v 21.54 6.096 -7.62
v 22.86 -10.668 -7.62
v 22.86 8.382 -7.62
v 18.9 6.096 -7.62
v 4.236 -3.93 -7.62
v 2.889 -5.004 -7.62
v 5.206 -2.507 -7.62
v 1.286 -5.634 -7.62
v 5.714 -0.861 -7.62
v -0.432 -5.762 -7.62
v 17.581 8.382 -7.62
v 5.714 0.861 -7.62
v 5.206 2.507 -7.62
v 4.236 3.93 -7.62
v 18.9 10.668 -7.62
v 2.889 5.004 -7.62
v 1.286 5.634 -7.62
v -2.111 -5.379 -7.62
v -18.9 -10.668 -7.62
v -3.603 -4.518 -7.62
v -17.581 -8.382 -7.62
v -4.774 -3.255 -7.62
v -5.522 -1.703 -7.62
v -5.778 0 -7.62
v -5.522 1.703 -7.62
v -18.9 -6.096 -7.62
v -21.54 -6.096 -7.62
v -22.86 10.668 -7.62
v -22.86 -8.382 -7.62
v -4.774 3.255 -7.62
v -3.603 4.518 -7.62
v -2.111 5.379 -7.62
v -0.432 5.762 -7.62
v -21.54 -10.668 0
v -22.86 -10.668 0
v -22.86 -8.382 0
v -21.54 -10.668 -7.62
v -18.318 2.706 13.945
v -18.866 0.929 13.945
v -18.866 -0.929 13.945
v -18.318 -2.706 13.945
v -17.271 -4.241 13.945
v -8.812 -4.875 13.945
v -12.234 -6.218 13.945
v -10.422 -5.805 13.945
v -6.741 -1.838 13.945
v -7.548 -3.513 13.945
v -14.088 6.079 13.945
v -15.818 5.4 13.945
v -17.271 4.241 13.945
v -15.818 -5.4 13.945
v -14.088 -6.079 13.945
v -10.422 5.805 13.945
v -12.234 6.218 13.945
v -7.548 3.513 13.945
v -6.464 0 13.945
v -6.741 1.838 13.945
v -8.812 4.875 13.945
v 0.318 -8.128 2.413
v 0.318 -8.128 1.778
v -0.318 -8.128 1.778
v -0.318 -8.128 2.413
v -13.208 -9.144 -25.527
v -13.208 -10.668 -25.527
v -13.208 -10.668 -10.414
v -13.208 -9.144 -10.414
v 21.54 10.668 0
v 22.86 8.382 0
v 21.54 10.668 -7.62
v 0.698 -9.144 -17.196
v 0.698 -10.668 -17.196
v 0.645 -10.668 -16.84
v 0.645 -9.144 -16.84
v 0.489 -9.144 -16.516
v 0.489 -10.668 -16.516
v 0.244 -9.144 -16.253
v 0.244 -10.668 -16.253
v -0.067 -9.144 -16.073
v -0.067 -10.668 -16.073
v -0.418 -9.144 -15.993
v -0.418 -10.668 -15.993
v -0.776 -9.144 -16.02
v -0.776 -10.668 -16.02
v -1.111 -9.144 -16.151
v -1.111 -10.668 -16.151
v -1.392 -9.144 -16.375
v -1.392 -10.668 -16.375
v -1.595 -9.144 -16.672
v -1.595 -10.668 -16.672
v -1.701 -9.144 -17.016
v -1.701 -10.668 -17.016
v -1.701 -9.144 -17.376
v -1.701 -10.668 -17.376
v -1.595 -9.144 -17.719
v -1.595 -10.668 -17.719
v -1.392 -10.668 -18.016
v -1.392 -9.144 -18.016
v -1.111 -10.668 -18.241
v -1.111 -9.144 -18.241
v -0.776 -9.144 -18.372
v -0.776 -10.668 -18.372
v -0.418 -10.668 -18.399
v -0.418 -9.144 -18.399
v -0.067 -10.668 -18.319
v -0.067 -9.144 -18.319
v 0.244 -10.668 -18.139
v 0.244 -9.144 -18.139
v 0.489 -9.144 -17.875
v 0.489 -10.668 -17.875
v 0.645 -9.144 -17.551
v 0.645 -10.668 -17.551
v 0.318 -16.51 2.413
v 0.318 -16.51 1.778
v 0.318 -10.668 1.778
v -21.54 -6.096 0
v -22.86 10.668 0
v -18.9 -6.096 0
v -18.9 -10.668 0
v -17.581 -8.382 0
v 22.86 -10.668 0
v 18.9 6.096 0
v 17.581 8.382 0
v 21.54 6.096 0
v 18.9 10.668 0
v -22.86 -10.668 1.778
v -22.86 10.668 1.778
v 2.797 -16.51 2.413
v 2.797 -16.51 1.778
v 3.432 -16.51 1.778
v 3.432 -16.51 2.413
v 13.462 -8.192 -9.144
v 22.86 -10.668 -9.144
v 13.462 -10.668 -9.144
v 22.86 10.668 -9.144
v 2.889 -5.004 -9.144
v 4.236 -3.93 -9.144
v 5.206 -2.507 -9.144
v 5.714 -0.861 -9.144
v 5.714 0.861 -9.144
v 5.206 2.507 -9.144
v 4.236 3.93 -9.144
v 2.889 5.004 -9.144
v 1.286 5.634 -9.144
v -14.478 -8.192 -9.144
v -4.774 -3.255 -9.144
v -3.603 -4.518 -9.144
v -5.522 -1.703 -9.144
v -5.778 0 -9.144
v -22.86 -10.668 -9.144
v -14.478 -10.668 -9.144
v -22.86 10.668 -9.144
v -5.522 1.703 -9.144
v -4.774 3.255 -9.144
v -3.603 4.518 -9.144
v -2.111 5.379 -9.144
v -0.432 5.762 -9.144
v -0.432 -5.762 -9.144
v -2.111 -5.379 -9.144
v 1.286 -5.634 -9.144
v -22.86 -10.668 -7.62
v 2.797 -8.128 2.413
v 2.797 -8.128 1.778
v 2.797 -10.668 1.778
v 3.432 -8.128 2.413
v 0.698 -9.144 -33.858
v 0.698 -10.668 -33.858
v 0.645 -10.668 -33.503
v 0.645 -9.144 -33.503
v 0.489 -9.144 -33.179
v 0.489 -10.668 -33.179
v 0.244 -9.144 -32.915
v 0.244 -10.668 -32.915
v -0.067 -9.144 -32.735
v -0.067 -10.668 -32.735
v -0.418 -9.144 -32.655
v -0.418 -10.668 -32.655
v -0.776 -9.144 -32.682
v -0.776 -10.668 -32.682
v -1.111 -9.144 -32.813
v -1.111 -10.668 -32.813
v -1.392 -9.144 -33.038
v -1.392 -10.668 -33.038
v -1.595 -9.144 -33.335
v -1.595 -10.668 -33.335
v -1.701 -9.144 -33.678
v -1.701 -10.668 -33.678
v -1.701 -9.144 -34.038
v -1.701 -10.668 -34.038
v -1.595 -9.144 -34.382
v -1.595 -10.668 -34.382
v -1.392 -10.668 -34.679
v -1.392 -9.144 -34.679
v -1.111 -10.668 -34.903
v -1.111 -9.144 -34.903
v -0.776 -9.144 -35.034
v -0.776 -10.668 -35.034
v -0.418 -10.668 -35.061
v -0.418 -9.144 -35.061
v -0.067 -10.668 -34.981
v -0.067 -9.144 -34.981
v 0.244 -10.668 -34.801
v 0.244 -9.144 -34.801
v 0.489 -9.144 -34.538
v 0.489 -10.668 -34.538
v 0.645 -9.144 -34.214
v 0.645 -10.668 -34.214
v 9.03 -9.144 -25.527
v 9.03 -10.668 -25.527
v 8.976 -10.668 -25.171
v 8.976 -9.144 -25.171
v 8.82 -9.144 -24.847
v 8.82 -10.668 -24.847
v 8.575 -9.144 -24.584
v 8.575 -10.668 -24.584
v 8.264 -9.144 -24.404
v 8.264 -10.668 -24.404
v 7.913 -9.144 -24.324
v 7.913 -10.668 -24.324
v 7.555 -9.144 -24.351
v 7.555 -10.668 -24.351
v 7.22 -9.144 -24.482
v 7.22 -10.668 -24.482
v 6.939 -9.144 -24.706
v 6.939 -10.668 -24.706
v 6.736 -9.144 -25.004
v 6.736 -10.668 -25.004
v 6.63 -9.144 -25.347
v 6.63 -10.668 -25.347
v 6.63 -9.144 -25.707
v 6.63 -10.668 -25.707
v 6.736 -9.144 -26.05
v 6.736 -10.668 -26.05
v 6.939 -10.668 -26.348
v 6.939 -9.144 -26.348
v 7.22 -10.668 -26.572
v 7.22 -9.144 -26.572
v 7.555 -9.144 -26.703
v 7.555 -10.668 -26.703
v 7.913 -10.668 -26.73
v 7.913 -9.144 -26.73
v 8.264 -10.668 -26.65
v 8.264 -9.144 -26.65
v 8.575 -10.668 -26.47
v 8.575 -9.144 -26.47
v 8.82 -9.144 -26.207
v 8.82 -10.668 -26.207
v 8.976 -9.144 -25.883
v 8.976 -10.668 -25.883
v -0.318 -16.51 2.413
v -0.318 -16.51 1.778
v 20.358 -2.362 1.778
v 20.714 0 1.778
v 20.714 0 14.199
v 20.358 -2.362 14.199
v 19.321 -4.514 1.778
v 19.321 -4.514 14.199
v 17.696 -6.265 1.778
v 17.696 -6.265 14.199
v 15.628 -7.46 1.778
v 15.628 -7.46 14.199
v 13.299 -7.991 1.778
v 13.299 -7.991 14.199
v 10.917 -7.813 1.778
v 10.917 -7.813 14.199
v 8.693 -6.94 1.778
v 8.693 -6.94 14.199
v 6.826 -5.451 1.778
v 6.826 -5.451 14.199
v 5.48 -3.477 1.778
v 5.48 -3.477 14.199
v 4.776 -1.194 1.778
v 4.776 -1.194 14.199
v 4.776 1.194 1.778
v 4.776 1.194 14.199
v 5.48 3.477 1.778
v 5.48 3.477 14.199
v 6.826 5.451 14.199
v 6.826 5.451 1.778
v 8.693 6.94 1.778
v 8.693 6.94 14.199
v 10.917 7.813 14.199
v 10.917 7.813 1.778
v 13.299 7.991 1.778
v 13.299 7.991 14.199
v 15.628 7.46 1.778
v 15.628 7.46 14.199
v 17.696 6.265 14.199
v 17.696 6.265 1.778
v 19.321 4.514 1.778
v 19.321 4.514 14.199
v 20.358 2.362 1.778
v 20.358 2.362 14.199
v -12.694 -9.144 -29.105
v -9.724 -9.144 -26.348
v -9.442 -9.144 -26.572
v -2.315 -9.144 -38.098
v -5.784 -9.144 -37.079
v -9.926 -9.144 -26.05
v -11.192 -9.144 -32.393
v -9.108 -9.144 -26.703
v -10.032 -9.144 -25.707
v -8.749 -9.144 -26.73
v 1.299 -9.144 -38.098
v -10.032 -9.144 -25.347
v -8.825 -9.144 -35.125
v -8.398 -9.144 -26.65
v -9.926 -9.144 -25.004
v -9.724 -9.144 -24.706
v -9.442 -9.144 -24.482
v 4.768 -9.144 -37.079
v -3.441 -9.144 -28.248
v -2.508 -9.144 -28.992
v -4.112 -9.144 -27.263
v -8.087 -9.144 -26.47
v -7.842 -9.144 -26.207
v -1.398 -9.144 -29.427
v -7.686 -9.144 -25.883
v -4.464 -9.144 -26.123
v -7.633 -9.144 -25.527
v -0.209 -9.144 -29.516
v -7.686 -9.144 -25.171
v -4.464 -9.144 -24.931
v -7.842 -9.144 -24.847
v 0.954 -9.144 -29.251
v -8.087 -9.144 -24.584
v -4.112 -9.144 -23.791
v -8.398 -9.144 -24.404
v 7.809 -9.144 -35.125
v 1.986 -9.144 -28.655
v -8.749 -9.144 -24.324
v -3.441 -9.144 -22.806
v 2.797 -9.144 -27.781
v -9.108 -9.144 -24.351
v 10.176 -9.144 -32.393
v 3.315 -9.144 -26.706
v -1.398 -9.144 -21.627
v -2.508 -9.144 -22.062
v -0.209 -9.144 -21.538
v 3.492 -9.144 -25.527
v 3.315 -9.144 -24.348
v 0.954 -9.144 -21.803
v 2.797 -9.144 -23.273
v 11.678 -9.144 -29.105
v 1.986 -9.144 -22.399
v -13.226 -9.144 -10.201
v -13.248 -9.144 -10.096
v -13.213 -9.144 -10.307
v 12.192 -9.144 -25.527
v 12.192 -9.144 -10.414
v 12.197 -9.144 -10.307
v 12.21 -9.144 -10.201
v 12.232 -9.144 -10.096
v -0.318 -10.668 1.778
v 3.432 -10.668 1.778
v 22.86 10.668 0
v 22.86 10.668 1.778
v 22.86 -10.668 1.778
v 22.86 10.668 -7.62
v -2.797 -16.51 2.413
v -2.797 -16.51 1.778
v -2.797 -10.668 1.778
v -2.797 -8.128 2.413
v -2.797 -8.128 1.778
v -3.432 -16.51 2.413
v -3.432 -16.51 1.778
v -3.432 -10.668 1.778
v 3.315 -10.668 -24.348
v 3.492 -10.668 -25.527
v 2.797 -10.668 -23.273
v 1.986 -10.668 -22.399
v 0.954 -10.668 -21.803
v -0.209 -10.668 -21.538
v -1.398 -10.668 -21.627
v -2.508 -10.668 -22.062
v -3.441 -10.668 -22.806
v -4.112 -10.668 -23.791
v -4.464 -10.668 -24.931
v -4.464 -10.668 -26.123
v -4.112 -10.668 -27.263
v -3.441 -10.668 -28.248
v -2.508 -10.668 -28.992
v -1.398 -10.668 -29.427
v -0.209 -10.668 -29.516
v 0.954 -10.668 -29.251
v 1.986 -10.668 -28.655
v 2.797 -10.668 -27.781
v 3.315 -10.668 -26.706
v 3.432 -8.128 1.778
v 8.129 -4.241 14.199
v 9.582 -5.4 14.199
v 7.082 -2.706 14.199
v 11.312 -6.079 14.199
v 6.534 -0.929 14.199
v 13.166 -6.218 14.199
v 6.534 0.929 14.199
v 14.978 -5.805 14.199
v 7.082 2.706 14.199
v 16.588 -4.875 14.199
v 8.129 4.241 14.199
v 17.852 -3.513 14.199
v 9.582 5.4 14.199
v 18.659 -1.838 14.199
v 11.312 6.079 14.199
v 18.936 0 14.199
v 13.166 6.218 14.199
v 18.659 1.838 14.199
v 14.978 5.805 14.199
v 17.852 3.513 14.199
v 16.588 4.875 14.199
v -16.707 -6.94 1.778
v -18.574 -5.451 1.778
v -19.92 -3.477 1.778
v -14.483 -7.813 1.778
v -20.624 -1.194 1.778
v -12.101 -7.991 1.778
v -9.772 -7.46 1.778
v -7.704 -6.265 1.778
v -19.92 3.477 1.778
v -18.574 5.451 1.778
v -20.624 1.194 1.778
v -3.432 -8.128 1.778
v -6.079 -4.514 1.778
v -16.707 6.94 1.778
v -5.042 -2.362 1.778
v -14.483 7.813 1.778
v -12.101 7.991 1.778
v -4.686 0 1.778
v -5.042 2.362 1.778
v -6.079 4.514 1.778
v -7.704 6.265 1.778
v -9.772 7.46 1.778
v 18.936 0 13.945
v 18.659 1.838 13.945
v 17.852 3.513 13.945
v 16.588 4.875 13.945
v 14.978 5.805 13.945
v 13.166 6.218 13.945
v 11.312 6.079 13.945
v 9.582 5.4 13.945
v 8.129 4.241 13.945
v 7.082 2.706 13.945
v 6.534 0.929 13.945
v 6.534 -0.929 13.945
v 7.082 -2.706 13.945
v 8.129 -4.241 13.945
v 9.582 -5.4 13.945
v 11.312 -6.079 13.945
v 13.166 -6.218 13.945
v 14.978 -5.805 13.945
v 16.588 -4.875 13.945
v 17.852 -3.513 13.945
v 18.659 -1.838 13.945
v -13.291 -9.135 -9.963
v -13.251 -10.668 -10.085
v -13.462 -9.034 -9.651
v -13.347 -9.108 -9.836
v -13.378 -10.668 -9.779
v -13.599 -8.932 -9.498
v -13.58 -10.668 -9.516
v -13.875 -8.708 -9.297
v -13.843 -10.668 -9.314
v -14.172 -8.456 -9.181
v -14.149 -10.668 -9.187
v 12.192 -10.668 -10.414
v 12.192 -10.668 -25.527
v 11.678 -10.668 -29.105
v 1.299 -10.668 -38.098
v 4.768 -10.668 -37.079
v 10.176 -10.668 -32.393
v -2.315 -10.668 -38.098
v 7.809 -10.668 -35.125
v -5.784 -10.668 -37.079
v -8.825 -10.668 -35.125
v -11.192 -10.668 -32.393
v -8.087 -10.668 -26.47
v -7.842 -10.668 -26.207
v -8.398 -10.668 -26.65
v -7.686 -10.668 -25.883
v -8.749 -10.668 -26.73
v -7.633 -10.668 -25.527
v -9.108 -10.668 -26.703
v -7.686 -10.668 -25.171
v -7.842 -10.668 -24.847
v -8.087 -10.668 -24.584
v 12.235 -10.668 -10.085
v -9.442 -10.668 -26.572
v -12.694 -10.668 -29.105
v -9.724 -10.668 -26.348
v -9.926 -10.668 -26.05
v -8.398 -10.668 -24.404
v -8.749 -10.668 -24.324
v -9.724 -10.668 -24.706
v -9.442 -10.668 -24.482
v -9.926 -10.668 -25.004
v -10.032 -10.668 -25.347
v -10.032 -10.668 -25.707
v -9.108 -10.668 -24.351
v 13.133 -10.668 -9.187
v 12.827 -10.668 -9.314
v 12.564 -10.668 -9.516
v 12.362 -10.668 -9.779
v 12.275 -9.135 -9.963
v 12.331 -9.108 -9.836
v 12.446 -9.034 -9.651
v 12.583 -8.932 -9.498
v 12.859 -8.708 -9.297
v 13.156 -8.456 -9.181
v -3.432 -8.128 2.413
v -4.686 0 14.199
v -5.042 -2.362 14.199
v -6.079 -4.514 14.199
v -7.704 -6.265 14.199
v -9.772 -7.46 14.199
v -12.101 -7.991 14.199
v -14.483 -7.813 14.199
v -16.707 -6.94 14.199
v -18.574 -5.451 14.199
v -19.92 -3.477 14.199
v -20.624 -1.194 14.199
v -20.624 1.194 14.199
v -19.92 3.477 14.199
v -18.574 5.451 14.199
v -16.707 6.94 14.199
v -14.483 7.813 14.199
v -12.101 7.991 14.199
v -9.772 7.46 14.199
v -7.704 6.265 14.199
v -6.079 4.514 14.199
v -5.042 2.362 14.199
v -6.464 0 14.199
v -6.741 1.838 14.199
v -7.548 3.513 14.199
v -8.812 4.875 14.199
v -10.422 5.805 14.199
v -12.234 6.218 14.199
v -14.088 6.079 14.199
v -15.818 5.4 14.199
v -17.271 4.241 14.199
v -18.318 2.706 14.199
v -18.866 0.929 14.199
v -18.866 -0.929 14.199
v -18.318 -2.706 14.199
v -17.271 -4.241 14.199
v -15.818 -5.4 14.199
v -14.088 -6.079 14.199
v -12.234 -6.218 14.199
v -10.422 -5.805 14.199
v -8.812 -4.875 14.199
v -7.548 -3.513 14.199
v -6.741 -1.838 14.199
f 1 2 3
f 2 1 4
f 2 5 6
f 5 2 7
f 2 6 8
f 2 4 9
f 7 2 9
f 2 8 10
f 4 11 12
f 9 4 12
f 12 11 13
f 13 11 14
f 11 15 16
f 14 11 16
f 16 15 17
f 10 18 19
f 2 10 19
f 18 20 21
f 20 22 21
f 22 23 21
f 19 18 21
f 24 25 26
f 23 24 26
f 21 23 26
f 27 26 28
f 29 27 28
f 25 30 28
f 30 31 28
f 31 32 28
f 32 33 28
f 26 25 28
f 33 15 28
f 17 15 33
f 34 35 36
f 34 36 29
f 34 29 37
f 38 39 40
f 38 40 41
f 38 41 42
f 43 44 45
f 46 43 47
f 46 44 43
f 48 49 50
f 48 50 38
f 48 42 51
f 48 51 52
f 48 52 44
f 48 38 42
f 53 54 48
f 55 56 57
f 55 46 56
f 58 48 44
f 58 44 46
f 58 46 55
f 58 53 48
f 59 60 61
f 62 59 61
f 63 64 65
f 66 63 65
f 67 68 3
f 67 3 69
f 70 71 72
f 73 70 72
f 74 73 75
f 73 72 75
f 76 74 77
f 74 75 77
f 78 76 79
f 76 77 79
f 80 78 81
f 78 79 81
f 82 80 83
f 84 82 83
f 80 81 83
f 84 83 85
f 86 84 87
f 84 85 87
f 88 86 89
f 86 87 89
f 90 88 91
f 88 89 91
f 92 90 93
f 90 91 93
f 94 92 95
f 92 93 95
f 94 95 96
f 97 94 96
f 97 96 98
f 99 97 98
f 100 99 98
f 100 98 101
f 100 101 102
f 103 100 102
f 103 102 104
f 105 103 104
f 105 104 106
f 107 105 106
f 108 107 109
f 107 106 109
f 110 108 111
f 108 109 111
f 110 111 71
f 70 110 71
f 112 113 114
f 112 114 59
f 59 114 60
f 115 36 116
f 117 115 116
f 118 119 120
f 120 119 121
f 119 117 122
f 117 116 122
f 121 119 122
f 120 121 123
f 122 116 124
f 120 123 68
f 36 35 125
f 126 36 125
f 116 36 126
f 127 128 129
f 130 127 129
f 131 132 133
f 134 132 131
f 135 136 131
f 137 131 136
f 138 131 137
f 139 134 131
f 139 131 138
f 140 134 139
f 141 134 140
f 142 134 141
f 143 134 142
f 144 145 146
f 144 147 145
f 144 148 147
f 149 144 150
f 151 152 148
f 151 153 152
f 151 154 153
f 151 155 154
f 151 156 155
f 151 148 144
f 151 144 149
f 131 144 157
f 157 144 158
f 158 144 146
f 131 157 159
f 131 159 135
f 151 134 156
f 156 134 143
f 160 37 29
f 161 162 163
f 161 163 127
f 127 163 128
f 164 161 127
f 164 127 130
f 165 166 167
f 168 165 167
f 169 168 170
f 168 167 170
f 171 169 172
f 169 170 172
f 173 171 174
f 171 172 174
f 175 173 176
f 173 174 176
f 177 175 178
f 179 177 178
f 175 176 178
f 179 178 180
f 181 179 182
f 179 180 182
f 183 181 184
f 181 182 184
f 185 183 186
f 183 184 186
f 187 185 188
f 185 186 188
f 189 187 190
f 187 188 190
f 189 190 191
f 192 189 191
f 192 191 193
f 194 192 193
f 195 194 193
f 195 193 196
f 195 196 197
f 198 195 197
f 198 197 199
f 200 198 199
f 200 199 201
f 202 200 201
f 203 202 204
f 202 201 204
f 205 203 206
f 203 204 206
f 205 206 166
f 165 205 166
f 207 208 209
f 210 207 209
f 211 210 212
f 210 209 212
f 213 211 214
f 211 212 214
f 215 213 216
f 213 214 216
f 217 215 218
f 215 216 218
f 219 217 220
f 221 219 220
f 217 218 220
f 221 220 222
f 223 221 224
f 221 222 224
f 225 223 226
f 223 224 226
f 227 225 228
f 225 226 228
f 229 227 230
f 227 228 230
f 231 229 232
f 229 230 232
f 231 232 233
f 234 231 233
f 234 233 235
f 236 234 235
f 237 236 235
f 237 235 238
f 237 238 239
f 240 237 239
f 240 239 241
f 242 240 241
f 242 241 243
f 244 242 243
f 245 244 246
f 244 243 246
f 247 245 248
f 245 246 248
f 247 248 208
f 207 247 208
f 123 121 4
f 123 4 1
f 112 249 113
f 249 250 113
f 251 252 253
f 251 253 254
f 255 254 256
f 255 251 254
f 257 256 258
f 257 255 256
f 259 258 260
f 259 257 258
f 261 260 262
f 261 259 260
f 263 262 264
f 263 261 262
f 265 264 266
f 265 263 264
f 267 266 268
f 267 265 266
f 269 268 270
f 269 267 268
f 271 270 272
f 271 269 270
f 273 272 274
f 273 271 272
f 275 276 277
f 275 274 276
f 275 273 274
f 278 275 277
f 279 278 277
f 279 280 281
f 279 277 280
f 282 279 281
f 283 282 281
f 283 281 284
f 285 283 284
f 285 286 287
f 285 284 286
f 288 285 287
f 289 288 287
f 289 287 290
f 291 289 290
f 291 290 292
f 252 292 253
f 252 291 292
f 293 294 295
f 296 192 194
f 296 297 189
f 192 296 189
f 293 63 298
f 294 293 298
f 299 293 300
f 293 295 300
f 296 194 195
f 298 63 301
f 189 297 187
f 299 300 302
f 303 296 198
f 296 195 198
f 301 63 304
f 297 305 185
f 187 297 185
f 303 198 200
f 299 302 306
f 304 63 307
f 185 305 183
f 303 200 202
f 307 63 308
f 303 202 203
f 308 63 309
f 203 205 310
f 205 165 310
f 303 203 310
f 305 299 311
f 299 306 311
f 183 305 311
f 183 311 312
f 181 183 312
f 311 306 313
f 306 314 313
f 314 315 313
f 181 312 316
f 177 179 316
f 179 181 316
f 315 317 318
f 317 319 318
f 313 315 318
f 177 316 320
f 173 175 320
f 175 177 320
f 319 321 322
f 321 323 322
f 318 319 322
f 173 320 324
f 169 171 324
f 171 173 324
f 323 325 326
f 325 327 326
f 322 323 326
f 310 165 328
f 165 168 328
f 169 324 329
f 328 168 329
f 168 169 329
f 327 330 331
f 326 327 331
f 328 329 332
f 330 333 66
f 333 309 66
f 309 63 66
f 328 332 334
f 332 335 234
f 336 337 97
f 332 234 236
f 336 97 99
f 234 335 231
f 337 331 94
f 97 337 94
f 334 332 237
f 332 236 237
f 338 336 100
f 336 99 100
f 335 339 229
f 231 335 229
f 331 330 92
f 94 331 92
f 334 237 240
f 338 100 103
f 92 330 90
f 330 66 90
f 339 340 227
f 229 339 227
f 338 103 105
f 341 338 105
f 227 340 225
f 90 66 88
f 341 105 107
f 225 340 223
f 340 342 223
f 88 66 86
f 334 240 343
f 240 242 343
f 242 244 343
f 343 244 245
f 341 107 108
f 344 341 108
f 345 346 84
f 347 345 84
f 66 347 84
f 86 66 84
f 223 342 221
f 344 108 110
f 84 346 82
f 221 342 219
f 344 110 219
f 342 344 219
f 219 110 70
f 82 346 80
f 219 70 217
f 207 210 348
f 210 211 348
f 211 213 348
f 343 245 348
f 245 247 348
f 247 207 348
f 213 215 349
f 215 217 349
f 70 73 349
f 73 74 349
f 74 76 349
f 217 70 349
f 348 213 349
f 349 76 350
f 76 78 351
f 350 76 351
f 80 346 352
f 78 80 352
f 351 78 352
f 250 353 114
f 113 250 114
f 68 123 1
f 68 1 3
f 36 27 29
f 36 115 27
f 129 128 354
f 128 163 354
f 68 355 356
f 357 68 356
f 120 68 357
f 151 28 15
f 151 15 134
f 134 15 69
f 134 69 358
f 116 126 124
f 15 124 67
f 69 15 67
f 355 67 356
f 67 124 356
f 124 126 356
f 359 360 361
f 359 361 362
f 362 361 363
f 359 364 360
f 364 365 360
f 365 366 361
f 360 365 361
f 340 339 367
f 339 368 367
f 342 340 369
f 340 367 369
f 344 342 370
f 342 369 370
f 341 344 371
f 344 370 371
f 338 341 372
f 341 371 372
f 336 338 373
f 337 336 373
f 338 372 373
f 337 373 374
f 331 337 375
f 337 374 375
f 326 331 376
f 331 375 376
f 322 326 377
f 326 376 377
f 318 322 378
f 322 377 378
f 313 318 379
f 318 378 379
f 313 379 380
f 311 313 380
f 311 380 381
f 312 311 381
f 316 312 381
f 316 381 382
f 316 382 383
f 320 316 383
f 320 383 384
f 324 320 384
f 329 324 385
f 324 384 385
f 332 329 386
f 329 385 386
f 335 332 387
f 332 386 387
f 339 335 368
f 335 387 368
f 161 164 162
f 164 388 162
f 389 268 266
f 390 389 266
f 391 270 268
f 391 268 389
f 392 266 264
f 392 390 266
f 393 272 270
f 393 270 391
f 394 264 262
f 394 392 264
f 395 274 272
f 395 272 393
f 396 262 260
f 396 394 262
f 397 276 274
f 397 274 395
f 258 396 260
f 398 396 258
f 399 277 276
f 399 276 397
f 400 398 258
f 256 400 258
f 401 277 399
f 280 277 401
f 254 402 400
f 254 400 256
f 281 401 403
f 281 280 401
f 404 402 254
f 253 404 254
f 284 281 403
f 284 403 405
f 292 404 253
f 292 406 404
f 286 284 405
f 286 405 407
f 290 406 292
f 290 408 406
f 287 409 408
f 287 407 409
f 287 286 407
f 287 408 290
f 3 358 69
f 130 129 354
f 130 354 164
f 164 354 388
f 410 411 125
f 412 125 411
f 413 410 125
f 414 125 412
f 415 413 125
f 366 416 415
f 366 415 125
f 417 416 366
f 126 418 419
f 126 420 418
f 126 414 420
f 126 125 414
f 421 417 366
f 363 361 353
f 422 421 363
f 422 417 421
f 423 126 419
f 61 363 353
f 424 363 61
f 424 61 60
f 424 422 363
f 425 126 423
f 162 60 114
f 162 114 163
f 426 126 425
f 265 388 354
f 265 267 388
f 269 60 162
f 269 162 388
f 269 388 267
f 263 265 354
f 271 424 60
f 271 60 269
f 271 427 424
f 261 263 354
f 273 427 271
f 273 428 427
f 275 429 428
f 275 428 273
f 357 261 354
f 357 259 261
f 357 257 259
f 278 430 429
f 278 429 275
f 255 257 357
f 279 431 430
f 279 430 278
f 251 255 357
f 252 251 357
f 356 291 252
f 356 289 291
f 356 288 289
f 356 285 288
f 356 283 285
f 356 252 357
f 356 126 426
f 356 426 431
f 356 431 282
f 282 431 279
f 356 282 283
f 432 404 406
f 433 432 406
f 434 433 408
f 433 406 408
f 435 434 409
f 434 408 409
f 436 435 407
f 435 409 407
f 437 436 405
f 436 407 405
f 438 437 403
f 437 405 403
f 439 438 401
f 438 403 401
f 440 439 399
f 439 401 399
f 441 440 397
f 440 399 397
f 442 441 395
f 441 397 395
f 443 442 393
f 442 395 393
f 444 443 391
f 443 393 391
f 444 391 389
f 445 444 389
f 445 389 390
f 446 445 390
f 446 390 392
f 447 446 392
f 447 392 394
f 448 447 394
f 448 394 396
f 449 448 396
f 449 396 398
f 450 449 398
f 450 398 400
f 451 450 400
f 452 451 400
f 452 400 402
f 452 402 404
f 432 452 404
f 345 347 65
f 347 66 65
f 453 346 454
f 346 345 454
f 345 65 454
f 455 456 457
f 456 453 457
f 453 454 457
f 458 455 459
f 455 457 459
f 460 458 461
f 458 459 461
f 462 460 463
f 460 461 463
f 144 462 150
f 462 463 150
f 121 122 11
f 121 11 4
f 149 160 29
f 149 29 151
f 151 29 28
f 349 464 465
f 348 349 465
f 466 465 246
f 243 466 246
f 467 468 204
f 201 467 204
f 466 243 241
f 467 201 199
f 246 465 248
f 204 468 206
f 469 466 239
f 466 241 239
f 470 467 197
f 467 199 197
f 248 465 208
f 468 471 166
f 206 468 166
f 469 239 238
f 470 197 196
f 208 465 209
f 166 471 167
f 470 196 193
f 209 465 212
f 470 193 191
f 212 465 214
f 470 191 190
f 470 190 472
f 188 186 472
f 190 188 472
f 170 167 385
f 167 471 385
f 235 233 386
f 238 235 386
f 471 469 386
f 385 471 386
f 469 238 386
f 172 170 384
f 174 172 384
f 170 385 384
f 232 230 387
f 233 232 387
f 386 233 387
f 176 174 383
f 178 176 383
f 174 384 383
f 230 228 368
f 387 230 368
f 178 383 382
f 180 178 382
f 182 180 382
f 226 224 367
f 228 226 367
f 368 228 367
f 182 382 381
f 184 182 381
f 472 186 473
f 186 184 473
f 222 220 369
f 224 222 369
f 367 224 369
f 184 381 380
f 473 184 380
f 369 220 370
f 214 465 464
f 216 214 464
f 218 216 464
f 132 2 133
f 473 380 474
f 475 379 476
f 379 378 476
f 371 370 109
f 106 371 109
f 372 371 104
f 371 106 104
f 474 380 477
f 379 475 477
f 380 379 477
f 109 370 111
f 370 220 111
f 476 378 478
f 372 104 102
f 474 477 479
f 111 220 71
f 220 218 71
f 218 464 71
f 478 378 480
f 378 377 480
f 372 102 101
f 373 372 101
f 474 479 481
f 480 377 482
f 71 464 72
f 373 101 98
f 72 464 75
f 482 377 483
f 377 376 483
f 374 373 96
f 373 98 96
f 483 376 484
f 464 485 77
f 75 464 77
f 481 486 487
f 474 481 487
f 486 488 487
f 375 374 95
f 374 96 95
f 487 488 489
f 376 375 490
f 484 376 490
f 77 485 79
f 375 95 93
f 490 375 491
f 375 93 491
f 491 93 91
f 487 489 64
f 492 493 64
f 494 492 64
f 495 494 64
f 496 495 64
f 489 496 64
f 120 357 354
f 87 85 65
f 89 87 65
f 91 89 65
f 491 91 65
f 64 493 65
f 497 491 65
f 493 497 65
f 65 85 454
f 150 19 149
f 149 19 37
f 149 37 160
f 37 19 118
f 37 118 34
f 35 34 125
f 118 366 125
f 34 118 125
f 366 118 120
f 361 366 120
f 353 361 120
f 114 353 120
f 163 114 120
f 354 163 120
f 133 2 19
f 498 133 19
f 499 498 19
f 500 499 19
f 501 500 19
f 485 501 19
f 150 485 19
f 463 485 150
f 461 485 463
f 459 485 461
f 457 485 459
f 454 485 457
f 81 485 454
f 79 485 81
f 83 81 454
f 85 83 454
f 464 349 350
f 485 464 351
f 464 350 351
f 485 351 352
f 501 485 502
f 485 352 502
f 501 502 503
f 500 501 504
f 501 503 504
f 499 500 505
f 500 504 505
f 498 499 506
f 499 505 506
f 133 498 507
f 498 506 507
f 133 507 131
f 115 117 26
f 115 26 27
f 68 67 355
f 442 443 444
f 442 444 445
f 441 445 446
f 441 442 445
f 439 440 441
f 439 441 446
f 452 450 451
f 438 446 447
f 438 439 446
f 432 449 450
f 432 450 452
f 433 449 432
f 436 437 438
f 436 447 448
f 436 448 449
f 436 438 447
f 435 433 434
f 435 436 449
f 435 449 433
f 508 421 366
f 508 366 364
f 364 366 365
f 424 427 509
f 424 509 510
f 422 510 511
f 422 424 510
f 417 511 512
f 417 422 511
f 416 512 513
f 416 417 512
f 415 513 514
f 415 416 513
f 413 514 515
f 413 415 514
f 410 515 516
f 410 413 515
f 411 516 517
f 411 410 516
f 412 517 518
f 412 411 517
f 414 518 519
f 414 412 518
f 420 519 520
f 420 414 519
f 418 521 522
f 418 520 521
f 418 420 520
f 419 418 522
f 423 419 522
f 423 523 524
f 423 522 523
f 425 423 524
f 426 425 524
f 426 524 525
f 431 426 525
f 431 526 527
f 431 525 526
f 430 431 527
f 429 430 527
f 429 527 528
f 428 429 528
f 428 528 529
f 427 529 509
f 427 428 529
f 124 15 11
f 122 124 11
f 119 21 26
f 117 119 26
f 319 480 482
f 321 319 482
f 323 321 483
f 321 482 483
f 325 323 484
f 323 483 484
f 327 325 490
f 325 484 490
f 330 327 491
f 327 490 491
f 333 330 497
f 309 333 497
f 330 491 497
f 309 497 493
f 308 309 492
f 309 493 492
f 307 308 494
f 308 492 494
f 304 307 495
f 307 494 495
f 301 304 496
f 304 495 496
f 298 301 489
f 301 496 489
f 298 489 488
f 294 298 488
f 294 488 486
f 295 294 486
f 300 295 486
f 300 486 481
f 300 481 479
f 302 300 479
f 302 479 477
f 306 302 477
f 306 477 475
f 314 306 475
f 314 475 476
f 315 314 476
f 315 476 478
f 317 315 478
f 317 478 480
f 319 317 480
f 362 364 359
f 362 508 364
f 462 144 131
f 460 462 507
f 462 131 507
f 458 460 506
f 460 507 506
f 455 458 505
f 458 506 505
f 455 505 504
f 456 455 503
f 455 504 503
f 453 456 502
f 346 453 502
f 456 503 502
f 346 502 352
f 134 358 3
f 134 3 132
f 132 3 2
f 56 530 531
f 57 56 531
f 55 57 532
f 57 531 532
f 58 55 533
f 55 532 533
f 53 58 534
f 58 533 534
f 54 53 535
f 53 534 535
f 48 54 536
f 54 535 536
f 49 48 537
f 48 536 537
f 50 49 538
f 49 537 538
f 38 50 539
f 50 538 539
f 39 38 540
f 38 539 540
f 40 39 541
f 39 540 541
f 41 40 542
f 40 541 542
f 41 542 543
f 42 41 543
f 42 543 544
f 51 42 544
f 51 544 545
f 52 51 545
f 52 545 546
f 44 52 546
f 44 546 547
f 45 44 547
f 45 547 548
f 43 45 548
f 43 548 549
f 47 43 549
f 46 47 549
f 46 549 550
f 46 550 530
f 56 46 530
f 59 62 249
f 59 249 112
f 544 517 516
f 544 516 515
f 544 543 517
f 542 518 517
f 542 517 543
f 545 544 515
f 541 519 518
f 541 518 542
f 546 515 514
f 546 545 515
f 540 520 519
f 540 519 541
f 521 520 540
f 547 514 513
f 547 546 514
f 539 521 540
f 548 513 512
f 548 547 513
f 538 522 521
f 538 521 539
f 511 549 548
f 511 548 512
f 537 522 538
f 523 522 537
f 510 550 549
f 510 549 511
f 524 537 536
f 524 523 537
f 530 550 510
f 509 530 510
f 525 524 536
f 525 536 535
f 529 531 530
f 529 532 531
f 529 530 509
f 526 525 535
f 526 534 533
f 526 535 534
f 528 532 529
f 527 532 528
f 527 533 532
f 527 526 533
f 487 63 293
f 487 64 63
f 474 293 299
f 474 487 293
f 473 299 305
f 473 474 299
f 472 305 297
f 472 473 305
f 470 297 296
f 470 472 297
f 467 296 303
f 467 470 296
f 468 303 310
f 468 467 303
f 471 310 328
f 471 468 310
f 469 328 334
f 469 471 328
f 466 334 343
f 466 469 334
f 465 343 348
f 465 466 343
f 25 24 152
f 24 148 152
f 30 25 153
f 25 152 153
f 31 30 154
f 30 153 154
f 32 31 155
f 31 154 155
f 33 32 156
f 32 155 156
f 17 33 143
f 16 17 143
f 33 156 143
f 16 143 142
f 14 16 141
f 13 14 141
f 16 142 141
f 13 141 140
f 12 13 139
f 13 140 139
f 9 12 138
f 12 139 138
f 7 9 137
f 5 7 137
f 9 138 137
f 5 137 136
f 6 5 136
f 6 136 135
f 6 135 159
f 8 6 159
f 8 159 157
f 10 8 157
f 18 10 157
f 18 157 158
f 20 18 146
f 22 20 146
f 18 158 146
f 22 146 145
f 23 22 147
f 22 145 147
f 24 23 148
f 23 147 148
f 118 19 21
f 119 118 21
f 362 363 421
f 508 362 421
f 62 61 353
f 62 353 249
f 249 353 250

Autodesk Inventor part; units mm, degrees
ref_plane "YZ Plane" through (0, 0, 0) normal (1, 0, 0) x (0, 1, 0)
ref_plane "XZ Plane" through (0, 0, 0) normal (0, 1, 0) x (-1, 0, 0)
sketch "Sketch1" plane through (0, 0, 0) normal (0, 0, 1) x (1, 0, 0)
  line L0 (-22.86, 10.668) -> (22.86, 10.668)
  line L1 (22.86, 10.668) -> (22.86, -10.668)
  line L2 (22.86, -10.668) -> (-22.86, -10.668)
  line L3 (-22.86, -10.668) -> (-22.86, 10.668)
  point P0 (0, 0)
  point P1 (-22.86, 0)
  point P2 (0, 10.668)
  dimension "d0" = 45.72
  dimension "d1" = 21.336
extrude "Extrusion1" add sketch "Sketch1" along normal blind 1.778
sketch "Sketch2" plane through (0, 0, 1.778) normal (0, 0, 1) x (1, 0, 0)
  circle A0 centre (-12.7, 0) radius 8.0137
  circle A1 centre (12.7, 0) radius 8.0137
  point P0 (0, 0)
  dimension "d4" = 16.0274
  dimension "d5" = 16.0274
  dimension "d6" = 12.7
  dimension "d7" = 12.7
extrude "Extrusion2" add sketch "Sketch2" along normal blind 12.4206
sketch "Sketch3" plane through (-12.7, 0, 14.1986) normal (0, 0, 1) x (1, 0, 0)
  circle A0 centre (0, 0) radius 8.0137 projected
  circle A1 centre (25.4, 0) radius 8.0137 projected
  circle A2 centre (0, 0) radius 6.2357
  circle A3 centre (25.4, 0) radius 6.2357
  point P0 (12.7, 0)
  dimension "d11" = 1.778
  dimension "d12" = 1.778
extrude "Extrusion3" cut sketch "Sketch3" against normal blind 0.254 contours A2 | A3
sketch "Sketch4" plane through (0, 0, 0) normal (0, 0, -1) x (-1, 0, 0)
  line L0 (-18.9005, 6.096) -> (-21.5402, 6.096)
  line L1 (-21.5402, 6.096) -> (-22.86, 8.382)
  line L2 (-22.86, 8.382) -> (-21.5402, 10.668)
  line L3 (-21.5402, 10.668) -> (-18.9005, 10.668)
  line L4 (-18.9005, 10.668) -> (-17.5807, 8.382)
  line L5 (-17.5807, 8.382) -> (-18.9005, 6.096)
  line L6 (21.5402, -10.668) -> (18.9005, -10.668)
  line L7 (18.9005, -10.668) -> (17.5807, -8.382)
  line L8 (17.5807, -8.382) -> (18.9005, -6.096)
  line L9 (18.9005, -6.096) -> (21.5402, -6.096)
  line L10 (21.5402, -6.096) -> (22.86, -8.382)
  line L11 (22.86, -8.382) -> (21.5402, -10.668)
  line L12 (22.86, 10.668) -> (-22.86, 10.668) projected
  line L13 (-22.86, -10.668) -> (22.86, -10.668) projected
  line L14 (22.86, -10.668) -> (22.86, 10.668) projected
  line L15 (-22.86, 10.668) -> (-22.86, -10.668) projected
  point P0 (0, 0)
  point P1 (-20.2204, 8.382)
  point P2 (20.2204, -8.382)
  dimension "d15" = 4.572
  dimension "d16" = 4.572
extrude "Extrusion4" add sketch "Sketch4" along normal blind 7.62 contours L0 L1 L2 L3 L4 L5 | L7 L8 L9 L10 L11 L6
sketch "Sketch5" plane through (0, 0, -7.62) normal (0, 0, -1) x (-1, 0, 0)
  line L0 (18.9005, -10.668) -> (17.5807, -8.382) projected
  line L1 (17.5807, -8.382) -> (18.9005, -6.096) projected
  line L2 (18.9005, -6.096) -> (21.5402, -6.096) projected
  line L3 (21.5402, -6.096) -> (22.86, -8.382) projected
  line L4 (22.86, -8.382) -> (22.86, 10.668) projected
  line L5 (22.86, 10.668) -> (-18.9005, 10.668) projected
  line L6 (-18.9005, 10.668) -> (-17.5807, 8.382) projected
  line L7 (-17.5807, 8.382) -> (-18.9005, 6.096) projected
  line L8 (-18.9005, 6.096) -> (-21.5402, 6.096) projected
  line L9 (-21.5402, 6.096) -> (-22.86, 8.382) projected
  line L10 (-22.86, 8.382) -> (-22.86, -10.668) projected
  line L11 (-22.86, -10.668) -> (18.9005, -10.668) projected
  line L12 (-21.5402, 10.668) -> (-22.86, 10.668) projected
  line L13 (-22.86, 10.668) -> (-22.86, 8.382) projected
  line L14 (-18.9005, 10.668) -> (-21.5402, 10.668) projected
  line L15 (18.9005, -10.668) -> (21.5402, -10.668) projected
  line L16 (22.86, -10.668) -> (22.86, -8.382) projected
  line L17 (21.5402, -10.668) -> (22.86, -10.668) projected
  line L18 (-21.5402, 6.096) -> (-18.9005, 6.096) projected
  line L19 (-22.86, 8.382) -> (-21.5402, 6.096) projected
  line L20 (-22.86, 10.668) -> (22.86, 10.668) projected
  line L21 (-22.86, 10.668) -> (22.86, 10.668)
  line L22 (22.86, 10.668) -> (22.86, -10.668)
  line L23 (22.86, -10.668) -> (-22.86, -10.668)
  line L24 (-22.86, -10.668) -> (-22.86, 10.668)
  point P0 (0, 0)
extrude "Extrusion5" add sketch "Sketch5" along normal blind 1.524
ref_plane "Work Plane1" through (-22.86, -10.668, 1.778) normal (0, -1, 0) x (1, 0, 0)
sketch "Sketch6" plane through (-22.86, -10.668, 1.778) normal (0, -1, 0) x (1, 0, 0)
  line L0 (0, -1.778) -> (0, -9.398) projected
  line L1 (22.352, -10.922) -> (22.352, -27.305) construction
  line L2 (35.052, -10.922) -> (35.052, -27.305)
  line L3 (9.652, -27.305) -> (9.652, -10.922)
  arc A0 (9.652, -27.305) -> (35.052, -27.305) centre (22.352, -27.305) ccw
  line L4 (0, -10.922) -> (45.72, -10.922) projected
  line L5 (35.052, -10.922) -> (9.652, -10.922)
  point P0 (22.86, -1.778)
  point P1 (22.352, -19.1135)
  point P2 (22.352, -40.005)
  dimension "d23" = 9.652
  dimension "d25" = 25.4
  dimension "d26" = 29.083
  dimension "d27" = 0
  dimension "d28" = 0
extrude "Extrusion6" add sketch "Sketch6" against normal blind 1.524
fillet "Fillet1" radius 0.9525 1 edges at (-0.508, -9.144, -9.144)
sketch "Sketch7" plane through (0, 0, -9.144) normal (0, 0, -1) x (-1, 0, 0)
  circle A0 centre (0, 0) radius 5.7785
  dimension "d32" = 11.557
extrude "Extrusion7" cut sketch "Sketch7" against normal up to next
sketch "Sketch8" plane through (-22.86, -10.668, 1.778) normal (0, -1, 0) x (1, 0, 0)
  arc A0 (9.652, -27.305) -> (35.052, -27.305) centre (22.352, -27.305) ccw projected
  line L0 (9.652, -27.305) -> (9.652, -10.922) projected
  line L1 (35.052, -10.922) -> (35.052, -27.305) projected
  circle A1 centre (22.352, -27.305) radius 4.0005
  circle A2 centre (22.352, -35.6362) radius 1.2065
  circle A3 centre (30.6832, -27.305) radius 1.2065
  circle A4 centre (14.0208, -27.305) radius 1.2065
  circle A5 centre (22.352, -18.9738) radius 1.2065
  point P0 (22.86, -1.778)
  dimension "d35" = 8.001
  dimension "d36" = 2.413
  dimension "d37" = 2.413
  dimension "d38" = 2.413
  dimension "d39" = 2.413
  dimension "d40" = 8.3312
  dimension "d41" = 8.3312
  dimension "d42" = 8.3312
  dimension "d43" = 8.3312
extrude "Extrusion8" cut sketch "Sketch8" against normal through all
fillet "Fillet2" radius 1.27 2 edges at (12.192, -9.4298, -9.144) (-13.208, -9.4298, -9.144)
sketch "Sketch9" plane through (0, 0, 1.778) normal (0, 0, 1) x (1, 0, 0)
  line L0 (-3.4317, -16.51) -> (-2.7967, -16.51)
  line L1 (-2.7967, -16.51) -> (-2.7967, -8.128)
  line L2 (-2.7967, -8.128) -> (-3.4317, -8.128)
  line L3 (-3.4317, -8.128) -> (-3.4317, -16.51)
  line L4 (-0.3175, -16.51) -> (0.3175, -16.51)
  line L5 (0.3175, -16.51) -> (0.3175, -8.128)
  line L6 (0.3175, -8.128) -> (-0.3175, -8.128)
  line L7 (-0.3175, -8.128) -> (-0.3175, -16.51)
  line L8 (2.7967, -16.51) -> (3.4317, -16.51)
  line L9 (3.4317, -16.51) -> (3.4317, -8.128)
  line L10 (3.4317, -8.128) -> (2.7967, -8.128)
  line L11 (2.7967, -8.128) -> (2.7967, -16.51)
  line L12 (-22.86, -10.668) -> (22.86, -10.668) projected
  point P0 (0, 0)
  point P1 (0, -8.128)
  point P2 (-2.7967, -12.319)
  point P3 (-0.3175, -12.319)
  point P4 (2.7967, -12.319)
  point P5 (-3.1142, -8.128)
  dimension "d47" = 2.4792
  dimension "d48" = 2.4792
  dimension "d49" = 0.635
  dimension "d50" = 8.382
  dimension "d51" = 2.54
extrude "Extrusion9" add sketch "Sketch9" along normal blind 0.635
equation "\"d5\" = d4"
equation "\"d7\" = d6"
equation "\"d12\" = d11"
equation "\"d16\" = d15"
equation "\"d37\" = d36"
equation "\"d38\" = d36"
equation "\"d39\" = d36"
equation "\"d41\" = d40"
equation "\"d42\" = d40"
equation "\"d43\" = d40"
equation "\"d48\" = d47"
properties part number "Ultrasound"
